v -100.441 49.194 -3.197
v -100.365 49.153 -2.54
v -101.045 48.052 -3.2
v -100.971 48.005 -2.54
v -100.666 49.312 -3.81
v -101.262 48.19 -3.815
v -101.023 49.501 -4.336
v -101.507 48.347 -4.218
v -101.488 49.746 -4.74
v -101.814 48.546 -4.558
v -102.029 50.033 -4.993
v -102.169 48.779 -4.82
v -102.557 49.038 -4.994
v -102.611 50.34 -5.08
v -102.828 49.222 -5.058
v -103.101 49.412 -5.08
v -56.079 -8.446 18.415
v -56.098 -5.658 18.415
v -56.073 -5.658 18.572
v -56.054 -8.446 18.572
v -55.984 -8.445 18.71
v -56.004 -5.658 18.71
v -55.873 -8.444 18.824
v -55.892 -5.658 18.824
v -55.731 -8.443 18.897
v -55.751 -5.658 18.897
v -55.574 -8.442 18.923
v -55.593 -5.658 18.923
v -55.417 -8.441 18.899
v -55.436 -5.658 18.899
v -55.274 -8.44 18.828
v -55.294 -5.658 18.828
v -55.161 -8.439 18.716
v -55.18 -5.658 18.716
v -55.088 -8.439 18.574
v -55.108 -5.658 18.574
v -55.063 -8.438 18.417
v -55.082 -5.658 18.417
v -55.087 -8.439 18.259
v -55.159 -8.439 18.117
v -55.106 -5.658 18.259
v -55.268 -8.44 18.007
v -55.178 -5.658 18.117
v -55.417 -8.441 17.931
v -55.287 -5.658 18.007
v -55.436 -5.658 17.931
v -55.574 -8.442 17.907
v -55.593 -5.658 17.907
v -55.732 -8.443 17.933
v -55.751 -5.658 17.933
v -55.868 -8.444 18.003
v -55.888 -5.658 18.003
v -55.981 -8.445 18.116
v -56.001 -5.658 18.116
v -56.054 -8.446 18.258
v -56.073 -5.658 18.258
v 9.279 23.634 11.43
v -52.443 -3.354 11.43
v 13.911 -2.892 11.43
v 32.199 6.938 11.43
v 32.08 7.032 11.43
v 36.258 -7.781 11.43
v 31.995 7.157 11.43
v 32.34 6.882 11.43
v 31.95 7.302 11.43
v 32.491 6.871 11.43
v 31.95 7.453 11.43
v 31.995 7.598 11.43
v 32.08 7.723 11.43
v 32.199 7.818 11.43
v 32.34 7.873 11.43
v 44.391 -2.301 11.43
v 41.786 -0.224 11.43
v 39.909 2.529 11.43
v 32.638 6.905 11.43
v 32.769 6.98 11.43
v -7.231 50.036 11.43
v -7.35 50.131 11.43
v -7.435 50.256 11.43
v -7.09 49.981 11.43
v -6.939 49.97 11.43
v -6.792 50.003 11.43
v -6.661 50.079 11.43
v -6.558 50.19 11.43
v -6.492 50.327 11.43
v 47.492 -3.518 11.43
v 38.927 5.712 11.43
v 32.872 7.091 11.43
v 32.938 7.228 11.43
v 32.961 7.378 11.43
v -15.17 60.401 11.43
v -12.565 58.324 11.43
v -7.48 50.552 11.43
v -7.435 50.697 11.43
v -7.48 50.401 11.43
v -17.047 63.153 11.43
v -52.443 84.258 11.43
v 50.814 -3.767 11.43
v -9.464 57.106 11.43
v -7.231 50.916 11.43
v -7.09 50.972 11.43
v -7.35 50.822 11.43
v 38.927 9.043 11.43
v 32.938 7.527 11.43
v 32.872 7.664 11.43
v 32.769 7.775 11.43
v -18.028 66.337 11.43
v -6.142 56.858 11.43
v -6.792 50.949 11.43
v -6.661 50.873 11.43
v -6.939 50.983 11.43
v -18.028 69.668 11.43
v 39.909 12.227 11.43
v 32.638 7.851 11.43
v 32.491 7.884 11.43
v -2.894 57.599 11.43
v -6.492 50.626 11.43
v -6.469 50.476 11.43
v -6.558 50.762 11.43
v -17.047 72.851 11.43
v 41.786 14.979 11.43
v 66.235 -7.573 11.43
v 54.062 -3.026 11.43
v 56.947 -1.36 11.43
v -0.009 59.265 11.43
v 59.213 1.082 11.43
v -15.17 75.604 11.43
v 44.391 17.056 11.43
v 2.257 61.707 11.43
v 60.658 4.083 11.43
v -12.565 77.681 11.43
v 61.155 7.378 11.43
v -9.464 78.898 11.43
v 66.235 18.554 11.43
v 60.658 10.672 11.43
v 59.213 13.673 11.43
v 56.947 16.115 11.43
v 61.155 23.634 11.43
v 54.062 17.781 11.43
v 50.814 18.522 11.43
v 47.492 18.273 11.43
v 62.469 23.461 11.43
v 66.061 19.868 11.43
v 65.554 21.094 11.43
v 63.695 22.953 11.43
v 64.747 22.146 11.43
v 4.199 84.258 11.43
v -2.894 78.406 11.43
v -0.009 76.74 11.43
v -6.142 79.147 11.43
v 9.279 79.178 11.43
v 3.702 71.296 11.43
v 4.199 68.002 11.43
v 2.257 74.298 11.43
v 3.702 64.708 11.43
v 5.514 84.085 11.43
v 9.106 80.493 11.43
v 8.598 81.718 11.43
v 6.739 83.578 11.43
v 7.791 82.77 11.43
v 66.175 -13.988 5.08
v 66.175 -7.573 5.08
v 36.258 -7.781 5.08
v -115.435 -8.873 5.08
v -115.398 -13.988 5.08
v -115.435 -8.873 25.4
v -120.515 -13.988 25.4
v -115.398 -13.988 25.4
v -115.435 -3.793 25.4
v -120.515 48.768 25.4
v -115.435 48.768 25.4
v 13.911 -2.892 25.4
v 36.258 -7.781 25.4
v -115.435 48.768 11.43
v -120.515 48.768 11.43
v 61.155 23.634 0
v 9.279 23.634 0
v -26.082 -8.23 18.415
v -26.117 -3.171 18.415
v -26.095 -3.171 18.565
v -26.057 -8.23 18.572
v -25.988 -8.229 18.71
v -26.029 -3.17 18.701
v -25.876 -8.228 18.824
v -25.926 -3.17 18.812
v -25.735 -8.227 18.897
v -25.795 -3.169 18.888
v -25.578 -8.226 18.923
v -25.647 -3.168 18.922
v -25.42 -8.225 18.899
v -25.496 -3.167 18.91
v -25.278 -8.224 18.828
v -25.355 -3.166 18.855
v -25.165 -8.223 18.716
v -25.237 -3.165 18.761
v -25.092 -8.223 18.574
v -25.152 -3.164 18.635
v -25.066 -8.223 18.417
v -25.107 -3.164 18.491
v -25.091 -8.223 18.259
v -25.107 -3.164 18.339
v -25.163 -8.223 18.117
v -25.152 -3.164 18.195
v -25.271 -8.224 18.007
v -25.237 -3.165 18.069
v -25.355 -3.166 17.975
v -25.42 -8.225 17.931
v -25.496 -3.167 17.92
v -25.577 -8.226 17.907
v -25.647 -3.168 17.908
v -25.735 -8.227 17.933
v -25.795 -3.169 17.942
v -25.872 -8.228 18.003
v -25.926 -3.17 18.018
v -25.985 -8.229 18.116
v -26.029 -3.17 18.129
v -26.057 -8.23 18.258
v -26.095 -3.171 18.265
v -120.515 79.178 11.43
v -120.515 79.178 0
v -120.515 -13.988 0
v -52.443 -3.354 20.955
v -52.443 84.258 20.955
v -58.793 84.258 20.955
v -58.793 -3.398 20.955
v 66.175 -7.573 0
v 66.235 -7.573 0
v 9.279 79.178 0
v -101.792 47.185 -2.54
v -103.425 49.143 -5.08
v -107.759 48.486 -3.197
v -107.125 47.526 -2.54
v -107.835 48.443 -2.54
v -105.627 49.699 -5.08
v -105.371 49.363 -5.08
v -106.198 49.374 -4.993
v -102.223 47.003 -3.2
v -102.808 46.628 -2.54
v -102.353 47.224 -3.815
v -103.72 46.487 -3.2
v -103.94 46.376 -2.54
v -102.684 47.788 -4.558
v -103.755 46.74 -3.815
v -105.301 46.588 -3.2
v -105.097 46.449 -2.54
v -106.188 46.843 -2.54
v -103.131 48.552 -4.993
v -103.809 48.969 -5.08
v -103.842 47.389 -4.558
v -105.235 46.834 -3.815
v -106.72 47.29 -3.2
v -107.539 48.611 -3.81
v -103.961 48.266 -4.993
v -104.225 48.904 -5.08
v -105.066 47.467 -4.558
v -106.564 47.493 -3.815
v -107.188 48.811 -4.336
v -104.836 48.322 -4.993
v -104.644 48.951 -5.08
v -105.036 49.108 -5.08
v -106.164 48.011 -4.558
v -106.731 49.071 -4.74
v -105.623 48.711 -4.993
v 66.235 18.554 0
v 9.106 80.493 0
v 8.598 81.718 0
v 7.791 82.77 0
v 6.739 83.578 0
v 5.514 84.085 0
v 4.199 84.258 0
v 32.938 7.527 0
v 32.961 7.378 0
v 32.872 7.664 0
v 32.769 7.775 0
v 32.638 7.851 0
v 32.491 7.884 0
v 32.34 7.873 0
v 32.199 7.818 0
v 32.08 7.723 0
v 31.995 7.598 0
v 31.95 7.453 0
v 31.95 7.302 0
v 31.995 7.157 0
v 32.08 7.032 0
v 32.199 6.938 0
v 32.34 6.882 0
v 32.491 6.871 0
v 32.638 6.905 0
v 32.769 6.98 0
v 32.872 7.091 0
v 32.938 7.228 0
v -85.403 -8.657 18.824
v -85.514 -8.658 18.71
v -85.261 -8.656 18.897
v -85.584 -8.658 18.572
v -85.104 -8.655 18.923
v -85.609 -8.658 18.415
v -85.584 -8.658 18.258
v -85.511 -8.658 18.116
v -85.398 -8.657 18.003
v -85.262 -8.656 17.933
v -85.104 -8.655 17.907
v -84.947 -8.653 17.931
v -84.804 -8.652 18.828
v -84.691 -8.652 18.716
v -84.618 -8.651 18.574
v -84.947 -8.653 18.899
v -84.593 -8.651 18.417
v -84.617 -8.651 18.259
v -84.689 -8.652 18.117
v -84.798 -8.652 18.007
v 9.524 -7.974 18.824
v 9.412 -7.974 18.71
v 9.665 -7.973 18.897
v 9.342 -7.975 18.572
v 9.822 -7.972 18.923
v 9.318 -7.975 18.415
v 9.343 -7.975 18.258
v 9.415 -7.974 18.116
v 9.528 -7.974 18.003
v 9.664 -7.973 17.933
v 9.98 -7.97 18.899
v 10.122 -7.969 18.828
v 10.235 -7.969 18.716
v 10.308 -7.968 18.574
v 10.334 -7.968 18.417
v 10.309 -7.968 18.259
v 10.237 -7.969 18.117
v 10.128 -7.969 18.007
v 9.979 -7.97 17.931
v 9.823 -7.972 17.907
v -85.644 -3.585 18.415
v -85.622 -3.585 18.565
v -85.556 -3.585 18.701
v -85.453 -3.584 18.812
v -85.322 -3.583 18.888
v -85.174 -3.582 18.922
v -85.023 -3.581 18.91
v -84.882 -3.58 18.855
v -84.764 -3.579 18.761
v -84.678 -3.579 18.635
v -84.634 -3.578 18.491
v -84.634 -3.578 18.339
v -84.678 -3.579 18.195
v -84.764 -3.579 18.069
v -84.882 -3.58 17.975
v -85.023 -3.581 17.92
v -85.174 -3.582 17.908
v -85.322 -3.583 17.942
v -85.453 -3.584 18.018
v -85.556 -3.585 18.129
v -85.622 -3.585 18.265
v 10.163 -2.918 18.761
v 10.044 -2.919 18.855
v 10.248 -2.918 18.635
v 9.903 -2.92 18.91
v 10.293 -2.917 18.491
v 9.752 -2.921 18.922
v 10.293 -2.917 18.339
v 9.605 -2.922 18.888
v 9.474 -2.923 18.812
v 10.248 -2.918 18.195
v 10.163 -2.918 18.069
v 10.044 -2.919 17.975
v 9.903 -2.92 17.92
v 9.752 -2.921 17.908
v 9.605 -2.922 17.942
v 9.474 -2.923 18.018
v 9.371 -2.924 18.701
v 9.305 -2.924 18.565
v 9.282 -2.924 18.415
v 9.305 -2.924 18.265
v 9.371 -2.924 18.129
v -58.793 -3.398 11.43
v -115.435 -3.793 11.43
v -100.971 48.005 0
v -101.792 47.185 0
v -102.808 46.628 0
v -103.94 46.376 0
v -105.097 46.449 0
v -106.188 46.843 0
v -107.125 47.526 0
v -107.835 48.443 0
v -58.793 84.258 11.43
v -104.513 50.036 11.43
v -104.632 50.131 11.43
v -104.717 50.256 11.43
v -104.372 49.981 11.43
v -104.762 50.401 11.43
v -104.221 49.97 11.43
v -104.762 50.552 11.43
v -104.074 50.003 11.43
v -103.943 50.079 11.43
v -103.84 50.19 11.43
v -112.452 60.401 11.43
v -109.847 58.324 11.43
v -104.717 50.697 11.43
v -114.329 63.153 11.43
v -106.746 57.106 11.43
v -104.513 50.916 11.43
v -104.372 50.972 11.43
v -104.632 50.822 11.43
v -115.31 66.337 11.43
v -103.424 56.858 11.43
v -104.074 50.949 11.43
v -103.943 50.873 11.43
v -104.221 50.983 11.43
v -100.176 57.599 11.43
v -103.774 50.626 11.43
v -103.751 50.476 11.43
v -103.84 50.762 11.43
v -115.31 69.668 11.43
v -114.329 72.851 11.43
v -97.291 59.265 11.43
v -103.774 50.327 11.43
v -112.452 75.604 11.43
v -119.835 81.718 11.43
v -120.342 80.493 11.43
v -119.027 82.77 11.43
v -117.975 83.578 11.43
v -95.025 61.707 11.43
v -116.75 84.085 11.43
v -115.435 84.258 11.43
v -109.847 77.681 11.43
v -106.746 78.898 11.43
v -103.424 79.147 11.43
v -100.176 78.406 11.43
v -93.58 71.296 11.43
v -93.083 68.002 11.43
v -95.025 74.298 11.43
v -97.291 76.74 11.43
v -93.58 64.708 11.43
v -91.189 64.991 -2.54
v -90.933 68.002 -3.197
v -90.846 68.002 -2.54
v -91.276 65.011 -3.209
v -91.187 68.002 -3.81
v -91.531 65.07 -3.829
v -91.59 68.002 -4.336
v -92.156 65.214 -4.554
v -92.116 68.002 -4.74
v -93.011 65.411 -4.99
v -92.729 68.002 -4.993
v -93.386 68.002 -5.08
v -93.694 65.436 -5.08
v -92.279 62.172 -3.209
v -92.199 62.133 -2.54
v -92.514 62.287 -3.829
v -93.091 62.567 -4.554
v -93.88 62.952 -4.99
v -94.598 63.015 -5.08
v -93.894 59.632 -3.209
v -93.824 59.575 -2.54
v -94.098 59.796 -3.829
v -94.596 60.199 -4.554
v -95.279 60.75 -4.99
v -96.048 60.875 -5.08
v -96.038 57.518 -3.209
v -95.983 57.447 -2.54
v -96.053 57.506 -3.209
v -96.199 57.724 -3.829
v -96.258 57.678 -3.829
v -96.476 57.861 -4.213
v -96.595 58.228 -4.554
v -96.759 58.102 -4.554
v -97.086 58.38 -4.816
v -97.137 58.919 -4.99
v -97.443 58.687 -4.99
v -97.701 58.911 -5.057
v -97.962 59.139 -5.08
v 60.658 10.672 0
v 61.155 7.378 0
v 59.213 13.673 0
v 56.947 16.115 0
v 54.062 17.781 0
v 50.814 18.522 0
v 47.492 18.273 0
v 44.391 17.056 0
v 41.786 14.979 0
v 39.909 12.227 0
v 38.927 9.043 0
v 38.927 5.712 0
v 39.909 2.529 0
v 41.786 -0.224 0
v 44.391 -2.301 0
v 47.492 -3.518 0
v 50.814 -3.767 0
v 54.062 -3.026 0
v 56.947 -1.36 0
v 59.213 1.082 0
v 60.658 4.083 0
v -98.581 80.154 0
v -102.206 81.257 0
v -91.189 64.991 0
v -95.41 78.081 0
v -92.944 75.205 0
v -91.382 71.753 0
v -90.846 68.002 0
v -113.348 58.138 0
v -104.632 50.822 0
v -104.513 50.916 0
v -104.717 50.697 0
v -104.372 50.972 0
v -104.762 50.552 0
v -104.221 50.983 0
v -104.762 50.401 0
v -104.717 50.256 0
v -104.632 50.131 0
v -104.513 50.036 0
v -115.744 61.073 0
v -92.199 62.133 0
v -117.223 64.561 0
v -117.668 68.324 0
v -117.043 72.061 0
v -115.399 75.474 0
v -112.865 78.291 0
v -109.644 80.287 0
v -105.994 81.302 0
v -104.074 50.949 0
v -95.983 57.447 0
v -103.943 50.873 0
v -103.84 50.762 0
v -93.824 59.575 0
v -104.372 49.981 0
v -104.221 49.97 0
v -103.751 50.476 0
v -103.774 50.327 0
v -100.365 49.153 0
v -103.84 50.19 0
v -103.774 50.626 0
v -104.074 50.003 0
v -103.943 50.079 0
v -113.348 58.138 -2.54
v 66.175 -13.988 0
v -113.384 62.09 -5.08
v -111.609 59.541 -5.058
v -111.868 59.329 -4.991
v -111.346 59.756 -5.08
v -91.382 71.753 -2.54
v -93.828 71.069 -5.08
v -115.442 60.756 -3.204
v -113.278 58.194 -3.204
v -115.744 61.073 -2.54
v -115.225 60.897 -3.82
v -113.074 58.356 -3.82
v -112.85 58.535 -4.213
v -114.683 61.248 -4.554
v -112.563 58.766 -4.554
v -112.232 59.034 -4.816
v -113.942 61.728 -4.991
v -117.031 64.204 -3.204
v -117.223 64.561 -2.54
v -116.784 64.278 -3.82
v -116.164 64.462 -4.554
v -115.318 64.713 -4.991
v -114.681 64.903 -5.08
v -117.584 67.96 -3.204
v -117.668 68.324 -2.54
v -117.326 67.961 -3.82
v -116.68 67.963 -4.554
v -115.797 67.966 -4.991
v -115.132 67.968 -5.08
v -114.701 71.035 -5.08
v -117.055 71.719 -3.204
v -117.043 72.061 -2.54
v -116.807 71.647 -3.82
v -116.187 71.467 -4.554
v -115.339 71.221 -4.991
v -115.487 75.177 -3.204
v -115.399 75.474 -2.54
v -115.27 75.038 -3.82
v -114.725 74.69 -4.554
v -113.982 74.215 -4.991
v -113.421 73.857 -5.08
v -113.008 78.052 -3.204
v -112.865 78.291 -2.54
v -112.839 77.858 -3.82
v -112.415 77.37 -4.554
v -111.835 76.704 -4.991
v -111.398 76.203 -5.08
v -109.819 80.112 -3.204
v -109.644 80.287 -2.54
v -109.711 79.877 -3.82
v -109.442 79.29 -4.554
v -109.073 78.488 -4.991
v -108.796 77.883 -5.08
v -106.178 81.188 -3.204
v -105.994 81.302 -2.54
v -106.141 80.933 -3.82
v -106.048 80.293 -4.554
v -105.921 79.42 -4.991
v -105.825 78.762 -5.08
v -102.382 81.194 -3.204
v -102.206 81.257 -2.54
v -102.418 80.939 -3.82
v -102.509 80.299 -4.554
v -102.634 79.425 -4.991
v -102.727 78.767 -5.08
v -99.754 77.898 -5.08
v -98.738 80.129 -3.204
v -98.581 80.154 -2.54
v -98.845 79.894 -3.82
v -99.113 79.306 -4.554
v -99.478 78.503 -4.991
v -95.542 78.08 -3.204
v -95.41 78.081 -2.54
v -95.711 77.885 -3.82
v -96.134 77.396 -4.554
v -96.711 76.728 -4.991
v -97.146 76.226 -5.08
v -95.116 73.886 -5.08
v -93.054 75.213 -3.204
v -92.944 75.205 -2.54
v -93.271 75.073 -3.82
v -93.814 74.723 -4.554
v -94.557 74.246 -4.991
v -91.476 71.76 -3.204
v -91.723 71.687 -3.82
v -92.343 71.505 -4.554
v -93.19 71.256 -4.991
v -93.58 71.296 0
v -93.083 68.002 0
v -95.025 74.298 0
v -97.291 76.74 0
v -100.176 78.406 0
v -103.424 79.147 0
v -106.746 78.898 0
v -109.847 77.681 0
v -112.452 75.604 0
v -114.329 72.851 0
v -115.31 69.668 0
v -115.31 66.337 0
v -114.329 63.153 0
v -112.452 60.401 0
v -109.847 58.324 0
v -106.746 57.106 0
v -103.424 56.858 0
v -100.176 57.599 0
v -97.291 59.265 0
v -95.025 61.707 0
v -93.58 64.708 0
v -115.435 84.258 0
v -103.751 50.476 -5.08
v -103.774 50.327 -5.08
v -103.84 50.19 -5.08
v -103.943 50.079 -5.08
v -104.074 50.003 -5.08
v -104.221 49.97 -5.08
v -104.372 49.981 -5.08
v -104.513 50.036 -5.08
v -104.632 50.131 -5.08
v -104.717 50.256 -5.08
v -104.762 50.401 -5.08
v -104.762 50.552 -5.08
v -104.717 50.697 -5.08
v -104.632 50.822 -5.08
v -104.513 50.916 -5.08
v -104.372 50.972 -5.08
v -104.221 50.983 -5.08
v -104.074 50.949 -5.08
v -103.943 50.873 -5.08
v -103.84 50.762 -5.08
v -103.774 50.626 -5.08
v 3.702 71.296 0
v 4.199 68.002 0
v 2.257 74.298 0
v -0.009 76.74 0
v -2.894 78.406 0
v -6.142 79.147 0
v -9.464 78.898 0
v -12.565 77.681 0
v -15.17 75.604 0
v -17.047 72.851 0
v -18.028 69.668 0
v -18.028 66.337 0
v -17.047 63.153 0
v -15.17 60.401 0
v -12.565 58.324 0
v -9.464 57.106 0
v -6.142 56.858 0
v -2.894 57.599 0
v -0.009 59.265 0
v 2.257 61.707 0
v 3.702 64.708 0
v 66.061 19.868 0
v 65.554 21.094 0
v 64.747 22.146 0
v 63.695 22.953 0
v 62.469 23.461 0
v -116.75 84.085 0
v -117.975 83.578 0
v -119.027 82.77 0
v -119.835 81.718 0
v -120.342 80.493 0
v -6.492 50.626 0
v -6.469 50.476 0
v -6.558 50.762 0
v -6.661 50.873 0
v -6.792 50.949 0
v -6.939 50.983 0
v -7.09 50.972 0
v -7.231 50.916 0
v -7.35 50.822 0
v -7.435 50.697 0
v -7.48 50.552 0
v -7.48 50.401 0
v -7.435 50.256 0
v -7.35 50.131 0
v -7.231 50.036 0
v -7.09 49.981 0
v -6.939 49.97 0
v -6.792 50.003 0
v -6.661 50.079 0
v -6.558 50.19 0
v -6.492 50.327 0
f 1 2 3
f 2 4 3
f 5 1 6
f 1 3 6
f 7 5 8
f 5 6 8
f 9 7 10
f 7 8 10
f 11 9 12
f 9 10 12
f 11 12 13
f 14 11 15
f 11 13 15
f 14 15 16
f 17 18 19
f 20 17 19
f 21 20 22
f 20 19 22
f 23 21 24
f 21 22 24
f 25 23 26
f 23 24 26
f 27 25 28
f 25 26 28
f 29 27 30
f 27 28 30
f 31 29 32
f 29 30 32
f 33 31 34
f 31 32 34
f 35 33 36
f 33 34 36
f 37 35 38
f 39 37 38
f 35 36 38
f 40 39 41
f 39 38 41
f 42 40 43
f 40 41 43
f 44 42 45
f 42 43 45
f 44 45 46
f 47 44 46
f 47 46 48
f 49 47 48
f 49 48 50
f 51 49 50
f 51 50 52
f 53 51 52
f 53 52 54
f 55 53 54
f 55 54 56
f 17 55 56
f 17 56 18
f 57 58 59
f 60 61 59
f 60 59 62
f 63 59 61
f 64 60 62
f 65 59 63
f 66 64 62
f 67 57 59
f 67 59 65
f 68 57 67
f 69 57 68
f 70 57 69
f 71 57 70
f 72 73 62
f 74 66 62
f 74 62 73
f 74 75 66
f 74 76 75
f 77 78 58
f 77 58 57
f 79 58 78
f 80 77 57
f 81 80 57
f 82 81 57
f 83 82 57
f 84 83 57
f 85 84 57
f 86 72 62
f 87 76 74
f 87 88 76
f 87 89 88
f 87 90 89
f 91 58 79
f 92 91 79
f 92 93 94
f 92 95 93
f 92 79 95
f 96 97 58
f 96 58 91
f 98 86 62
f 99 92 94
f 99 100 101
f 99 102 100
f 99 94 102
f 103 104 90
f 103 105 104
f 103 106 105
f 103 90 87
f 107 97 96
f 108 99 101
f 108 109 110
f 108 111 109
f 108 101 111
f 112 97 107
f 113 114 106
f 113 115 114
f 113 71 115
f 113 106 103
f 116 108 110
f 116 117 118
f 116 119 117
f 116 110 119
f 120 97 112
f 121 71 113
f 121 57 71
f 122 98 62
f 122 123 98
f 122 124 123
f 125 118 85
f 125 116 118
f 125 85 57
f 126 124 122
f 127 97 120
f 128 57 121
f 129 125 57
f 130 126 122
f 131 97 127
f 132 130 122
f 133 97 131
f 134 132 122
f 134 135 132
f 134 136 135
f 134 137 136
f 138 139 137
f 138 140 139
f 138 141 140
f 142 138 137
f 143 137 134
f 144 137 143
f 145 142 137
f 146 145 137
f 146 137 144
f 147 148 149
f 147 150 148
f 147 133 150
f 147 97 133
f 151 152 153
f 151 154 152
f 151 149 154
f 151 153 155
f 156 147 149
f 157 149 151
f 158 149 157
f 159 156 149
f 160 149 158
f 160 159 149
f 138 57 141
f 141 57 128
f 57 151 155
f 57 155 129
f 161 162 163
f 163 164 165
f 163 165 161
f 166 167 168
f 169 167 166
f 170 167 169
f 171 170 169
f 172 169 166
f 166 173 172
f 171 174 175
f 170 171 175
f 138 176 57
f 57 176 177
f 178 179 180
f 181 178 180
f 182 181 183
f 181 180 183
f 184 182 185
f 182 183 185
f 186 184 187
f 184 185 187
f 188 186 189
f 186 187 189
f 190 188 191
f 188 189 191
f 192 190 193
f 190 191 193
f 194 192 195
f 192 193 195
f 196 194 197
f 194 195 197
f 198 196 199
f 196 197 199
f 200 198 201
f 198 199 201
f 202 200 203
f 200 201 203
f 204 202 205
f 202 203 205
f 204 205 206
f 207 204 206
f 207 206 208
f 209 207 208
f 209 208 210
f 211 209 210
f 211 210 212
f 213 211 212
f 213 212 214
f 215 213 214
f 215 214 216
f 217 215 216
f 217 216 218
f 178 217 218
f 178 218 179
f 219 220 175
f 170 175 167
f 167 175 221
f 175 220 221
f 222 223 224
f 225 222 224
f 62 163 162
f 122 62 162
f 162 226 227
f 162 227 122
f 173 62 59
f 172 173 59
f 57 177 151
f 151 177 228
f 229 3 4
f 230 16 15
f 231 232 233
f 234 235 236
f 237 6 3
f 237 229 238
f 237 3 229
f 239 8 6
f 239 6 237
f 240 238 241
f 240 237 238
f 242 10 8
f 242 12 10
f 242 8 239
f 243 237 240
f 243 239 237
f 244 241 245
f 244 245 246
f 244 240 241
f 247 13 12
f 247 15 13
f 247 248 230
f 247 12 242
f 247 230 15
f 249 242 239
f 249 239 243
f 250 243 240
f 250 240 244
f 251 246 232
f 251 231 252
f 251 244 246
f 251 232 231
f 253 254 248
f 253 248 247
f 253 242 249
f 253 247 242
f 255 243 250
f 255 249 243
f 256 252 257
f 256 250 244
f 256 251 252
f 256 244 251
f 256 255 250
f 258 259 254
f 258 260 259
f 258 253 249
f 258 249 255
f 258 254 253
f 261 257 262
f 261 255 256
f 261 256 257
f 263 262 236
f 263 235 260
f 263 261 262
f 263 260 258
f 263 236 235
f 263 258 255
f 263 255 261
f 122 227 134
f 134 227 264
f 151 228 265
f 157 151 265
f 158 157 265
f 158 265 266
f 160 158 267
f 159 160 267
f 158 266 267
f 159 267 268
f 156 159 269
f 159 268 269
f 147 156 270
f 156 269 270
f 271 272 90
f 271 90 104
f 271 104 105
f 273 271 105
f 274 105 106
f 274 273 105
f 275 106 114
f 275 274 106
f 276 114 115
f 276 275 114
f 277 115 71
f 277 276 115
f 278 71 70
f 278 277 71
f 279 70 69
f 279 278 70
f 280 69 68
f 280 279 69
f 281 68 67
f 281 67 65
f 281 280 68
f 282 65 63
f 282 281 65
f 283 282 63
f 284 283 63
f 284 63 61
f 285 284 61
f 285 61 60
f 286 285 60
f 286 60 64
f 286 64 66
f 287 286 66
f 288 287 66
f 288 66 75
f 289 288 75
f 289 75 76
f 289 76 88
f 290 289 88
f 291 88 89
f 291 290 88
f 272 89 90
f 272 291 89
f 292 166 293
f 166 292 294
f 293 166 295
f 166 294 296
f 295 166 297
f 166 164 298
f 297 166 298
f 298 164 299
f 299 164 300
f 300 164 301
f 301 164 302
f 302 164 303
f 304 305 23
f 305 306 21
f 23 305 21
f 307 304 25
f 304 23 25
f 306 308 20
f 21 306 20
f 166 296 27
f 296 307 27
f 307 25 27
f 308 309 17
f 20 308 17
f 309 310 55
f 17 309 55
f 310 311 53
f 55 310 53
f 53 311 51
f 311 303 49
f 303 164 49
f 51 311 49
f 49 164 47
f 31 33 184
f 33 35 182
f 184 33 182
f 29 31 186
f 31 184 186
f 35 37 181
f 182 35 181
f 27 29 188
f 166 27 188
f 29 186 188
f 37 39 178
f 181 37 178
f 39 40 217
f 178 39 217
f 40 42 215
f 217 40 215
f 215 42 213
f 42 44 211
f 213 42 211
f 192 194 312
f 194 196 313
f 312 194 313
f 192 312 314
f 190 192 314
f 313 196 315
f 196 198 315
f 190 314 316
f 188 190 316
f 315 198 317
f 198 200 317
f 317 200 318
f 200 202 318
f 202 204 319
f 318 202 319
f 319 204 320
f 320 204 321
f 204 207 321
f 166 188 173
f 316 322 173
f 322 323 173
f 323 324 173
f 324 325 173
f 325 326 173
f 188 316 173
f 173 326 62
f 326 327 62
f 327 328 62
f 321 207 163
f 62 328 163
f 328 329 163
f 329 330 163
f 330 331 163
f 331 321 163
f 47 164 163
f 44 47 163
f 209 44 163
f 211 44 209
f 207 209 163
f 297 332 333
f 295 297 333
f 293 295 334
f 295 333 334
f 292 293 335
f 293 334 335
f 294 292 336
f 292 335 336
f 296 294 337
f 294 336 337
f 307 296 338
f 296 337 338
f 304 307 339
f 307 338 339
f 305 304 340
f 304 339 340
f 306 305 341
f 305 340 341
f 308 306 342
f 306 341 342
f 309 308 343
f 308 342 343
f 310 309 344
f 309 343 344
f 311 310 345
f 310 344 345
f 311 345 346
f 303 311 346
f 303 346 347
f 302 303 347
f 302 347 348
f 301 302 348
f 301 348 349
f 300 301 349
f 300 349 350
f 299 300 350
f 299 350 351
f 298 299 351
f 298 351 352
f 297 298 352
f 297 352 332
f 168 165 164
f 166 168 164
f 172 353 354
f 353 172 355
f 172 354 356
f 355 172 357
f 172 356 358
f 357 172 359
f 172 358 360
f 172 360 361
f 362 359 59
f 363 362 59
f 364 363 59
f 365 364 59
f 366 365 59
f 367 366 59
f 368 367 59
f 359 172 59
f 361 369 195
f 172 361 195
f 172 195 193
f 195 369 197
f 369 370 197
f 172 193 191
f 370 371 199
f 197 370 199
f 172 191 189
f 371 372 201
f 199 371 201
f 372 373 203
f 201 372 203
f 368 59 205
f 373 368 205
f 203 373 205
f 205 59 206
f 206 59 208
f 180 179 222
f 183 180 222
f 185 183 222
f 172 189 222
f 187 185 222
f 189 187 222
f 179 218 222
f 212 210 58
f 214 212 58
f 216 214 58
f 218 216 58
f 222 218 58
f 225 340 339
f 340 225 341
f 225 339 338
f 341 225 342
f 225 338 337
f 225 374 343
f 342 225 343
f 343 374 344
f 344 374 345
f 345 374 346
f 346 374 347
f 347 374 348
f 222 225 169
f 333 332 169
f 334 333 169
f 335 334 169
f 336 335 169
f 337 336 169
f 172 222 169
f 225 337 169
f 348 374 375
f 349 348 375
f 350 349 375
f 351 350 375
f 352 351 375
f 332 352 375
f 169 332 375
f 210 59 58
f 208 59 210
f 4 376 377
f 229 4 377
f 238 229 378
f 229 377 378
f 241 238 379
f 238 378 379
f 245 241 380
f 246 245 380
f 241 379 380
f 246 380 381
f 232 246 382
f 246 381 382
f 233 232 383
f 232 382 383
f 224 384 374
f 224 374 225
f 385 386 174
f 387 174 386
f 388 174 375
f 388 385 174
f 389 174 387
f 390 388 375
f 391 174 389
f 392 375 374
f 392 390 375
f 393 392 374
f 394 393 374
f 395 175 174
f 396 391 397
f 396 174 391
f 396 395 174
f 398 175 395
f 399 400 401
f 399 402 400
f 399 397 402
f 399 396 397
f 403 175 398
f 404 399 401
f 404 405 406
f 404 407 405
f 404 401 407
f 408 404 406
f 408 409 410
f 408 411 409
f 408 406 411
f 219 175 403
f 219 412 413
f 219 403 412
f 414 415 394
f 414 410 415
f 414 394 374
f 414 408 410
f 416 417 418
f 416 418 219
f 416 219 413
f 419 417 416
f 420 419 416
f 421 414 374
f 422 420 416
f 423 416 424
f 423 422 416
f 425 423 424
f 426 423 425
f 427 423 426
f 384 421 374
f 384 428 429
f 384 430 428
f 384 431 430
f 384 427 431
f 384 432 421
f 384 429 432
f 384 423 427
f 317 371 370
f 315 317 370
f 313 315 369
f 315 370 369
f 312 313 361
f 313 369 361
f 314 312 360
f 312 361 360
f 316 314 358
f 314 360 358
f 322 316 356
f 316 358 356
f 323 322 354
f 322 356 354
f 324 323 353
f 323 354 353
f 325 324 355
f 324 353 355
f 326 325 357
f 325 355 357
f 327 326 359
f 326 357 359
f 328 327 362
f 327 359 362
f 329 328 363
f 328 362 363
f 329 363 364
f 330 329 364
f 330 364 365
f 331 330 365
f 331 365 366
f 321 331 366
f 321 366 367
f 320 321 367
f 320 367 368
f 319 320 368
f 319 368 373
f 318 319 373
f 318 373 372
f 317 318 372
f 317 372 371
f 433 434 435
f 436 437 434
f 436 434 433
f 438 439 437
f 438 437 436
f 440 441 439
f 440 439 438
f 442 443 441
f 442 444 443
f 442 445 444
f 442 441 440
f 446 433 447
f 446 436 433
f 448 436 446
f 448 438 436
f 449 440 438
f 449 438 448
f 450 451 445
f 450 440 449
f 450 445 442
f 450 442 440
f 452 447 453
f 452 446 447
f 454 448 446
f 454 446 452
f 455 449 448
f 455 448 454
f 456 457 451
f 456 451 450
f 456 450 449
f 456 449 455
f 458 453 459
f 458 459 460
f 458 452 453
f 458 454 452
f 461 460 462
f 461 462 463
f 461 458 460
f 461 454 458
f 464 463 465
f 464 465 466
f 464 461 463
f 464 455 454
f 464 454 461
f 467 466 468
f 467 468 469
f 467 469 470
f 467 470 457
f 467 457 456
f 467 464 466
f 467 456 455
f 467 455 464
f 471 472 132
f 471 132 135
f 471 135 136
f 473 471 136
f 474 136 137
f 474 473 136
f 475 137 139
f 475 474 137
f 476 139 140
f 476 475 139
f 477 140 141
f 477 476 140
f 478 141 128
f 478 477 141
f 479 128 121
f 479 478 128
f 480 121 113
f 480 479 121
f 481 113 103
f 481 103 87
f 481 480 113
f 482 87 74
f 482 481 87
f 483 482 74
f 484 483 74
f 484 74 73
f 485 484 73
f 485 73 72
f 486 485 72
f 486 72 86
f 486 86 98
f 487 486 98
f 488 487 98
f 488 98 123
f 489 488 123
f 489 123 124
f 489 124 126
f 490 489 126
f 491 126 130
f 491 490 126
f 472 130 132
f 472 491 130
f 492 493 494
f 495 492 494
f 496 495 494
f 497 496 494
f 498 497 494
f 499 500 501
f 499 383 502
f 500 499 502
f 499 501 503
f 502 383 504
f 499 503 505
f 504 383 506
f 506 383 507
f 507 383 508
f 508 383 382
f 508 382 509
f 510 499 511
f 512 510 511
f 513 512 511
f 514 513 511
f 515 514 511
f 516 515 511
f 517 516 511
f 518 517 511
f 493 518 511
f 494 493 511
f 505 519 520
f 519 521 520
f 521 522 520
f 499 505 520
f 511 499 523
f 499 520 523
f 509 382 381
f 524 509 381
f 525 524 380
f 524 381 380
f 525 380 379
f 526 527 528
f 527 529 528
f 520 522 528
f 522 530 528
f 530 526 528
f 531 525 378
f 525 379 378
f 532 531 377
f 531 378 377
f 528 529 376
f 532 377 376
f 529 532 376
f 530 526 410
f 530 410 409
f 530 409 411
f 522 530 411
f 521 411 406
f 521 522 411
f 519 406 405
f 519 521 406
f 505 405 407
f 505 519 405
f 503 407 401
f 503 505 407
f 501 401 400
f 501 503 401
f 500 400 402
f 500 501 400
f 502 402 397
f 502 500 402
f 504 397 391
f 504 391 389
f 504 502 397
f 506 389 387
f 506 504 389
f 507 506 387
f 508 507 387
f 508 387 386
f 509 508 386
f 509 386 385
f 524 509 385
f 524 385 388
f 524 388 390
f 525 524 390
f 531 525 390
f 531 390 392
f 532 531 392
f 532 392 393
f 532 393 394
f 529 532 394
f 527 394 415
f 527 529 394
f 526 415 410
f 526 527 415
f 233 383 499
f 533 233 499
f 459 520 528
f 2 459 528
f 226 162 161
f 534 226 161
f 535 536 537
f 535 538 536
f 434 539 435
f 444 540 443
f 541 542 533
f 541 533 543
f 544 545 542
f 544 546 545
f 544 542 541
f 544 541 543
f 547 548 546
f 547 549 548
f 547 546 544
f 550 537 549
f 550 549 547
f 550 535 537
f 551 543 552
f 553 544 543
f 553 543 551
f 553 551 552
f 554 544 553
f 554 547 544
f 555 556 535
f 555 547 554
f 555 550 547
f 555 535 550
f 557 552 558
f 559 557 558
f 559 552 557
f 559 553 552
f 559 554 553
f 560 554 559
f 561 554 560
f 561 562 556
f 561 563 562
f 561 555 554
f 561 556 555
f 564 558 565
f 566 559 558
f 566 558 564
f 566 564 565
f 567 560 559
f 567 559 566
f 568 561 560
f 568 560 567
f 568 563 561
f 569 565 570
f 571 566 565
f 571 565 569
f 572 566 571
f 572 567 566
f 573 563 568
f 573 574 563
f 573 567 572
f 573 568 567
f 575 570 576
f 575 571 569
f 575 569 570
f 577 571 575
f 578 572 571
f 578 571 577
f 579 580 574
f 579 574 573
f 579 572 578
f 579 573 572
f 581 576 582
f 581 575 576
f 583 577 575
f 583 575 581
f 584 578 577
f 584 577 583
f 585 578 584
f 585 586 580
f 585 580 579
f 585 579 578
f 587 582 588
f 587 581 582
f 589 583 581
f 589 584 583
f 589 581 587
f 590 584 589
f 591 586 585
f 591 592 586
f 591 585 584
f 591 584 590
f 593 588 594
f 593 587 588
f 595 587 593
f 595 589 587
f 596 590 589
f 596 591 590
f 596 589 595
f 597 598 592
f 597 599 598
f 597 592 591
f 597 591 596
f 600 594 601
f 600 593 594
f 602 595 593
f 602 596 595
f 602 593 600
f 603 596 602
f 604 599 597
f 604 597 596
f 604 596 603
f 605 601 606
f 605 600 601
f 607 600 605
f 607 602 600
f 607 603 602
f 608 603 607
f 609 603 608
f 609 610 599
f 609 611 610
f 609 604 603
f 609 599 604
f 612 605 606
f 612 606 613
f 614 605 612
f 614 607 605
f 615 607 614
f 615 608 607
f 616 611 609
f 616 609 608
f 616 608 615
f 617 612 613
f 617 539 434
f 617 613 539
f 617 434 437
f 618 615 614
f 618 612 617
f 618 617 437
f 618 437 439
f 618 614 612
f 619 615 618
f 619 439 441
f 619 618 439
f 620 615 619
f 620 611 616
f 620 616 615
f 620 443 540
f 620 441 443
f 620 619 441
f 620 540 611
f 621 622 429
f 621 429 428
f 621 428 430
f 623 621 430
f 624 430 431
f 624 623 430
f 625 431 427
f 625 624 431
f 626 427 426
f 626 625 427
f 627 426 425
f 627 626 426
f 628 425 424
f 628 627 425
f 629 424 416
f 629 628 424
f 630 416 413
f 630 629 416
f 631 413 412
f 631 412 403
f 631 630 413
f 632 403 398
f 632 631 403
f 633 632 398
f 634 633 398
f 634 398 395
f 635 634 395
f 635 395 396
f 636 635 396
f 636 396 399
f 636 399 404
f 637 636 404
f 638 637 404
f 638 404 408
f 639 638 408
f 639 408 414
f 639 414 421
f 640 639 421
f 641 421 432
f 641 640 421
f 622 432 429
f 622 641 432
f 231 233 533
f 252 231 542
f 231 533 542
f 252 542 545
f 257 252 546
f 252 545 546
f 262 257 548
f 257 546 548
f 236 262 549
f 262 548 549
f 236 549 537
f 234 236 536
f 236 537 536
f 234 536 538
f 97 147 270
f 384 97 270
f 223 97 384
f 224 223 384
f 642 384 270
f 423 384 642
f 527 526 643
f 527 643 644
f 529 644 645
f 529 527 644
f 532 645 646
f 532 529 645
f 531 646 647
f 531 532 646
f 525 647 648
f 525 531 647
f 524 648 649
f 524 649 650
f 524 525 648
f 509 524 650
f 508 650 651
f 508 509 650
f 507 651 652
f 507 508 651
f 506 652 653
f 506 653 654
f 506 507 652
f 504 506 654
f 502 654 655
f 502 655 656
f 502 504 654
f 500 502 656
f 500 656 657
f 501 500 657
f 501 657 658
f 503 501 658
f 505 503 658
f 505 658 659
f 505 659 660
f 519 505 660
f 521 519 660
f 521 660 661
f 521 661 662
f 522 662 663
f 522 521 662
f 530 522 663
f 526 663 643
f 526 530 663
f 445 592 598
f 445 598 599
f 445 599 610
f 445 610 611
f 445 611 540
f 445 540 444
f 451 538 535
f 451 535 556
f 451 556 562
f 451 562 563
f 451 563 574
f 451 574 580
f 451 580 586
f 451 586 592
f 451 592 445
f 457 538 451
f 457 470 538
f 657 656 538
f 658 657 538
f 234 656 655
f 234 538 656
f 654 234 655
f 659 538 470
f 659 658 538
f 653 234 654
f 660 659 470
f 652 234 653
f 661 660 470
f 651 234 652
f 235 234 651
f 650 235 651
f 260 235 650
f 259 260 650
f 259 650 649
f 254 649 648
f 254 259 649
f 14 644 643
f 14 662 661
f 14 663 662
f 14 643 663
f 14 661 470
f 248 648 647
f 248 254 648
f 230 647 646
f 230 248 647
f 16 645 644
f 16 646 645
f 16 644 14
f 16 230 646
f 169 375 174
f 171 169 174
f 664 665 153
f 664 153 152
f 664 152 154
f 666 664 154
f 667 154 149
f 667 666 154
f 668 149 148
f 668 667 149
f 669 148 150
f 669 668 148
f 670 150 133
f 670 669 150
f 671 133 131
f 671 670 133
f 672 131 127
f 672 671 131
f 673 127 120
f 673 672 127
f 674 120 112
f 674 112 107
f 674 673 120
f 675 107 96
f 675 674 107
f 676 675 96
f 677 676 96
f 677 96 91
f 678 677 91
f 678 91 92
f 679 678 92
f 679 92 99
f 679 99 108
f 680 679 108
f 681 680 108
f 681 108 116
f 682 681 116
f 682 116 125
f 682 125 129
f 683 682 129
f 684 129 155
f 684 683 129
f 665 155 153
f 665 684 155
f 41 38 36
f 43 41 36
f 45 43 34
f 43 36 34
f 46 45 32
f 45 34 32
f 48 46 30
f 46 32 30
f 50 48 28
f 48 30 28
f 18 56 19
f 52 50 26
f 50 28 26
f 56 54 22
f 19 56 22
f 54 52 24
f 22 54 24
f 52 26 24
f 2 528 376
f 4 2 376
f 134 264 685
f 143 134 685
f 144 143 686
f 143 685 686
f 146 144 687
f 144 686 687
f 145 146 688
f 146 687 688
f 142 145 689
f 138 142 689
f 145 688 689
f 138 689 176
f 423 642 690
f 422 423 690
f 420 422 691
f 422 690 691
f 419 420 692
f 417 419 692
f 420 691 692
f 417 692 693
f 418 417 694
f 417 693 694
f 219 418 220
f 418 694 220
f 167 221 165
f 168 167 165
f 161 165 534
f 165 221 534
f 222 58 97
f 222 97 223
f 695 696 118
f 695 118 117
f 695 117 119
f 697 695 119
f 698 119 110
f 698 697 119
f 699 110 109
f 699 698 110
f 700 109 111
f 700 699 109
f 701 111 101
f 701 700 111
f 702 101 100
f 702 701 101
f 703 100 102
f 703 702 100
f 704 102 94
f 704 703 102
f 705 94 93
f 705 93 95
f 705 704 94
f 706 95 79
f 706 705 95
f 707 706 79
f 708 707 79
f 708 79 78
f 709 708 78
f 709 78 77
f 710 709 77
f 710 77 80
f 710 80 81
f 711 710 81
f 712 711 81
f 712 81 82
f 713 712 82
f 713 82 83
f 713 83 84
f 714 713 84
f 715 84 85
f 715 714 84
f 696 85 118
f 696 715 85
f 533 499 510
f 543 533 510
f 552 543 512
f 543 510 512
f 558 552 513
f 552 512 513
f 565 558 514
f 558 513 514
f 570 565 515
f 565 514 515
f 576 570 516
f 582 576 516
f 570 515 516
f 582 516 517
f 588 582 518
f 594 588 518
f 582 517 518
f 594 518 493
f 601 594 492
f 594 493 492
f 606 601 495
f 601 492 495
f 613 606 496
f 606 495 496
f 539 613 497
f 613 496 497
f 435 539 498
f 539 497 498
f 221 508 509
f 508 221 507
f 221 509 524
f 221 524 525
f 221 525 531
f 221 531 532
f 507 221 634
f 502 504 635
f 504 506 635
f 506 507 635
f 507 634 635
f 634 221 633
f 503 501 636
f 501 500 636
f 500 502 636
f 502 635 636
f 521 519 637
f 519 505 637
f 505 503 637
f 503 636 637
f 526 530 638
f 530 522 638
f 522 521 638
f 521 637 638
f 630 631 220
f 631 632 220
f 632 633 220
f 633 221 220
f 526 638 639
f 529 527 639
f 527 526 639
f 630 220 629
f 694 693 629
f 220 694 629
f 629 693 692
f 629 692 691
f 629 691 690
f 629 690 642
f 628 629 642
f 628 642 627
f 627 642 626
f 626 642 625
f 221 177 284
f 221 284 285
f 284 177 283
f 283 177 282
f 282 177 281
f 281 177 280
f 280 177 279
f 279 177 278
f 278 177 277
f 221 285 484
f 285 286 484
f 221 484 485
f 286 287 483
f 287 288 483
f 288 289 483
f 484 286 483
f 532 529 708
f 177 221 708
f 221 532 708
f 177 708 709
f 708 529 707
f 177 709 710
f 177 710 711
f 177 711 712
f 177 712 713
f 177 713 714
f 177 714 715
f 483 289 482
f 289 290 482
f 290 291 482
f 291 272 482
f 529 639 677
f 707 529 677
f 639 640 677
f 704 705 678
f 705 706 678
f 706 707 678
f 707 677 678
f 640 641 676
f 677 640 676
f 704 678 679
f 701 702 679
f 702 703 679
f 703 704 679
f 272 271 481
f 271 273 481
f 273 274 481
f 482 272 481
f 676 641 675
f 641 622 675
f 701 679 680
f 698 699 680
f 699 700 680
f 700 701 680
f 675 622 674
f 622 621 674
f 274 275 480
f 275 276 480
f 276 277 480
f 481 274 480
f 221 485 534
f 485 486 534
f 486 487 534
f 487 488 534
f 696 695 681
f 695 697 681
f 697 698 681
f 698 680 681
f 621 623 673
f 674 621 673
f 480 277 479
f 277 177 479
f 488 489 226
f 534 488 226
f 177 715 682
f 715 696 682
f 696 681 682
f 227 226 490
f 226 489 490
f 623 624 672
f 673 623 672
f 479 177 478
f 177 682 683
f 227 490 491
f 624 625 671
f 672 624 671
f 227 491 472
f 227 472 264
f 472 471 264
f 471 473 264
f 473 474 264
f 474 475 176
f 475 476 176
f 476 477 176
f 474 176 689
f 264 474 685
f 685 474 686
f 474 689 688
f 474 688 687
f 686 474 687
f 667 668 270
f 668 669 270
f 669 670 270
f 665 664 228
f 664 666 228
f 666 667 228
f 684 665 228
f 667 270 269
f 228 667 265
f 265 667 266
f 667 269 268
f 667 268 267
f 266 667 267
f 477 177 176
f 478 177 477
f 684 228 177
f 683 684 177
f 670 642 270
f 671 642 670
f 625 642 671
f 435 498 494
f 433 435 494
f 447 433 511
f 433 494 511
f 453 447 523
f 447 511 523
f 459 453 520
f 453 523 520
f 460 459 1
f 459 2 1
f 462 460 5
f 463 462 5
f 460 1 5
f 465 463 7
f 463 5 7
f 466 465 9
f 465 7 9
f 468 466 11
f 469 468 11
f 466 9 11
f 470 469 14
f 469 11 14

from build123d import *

# Parameters (mm, degrees)
F0_R      = 0.508
F0_R_2    = 11.176
F1_DEPTH  = 11.43
F3_DEPTH  = 25.4
F4_R      = 0.508
F5_DEPTH  = 11.4608454435
F6_W      = 6.7929165438
F6_H      = 5.08
F7_DEPTH  = 186.69
F8_W      = 6.35
F8_H      = 9.525
F9_DEPTH  = 89.916
F10_R     = 11.176
F10_R_2   = 0.508
F11_DEPTH = 5.08
F12_R     = 2.54


with BuildPart() as f1:
    # F0 (on Top) → F1 (new body)
    with BuildSketch(Plane.XY):
        with BuildLine():
            Line((9.2787205281, 23.6336458474), (9.2787205281, 79.1782657933))
            ThreePointArc((9.2787205281, 79.1782657933), (7.7908229766, 82.7703682418), (4.1987205281, 84.2582657933))
            Line((4.1987205281, 84.2582657933), (-115.4352794719, 84.2582657933))
            ThreePointArc((-115.4352794719, 84.2582657933), (-119.0273819203, 82.7703682418), (-120.5152794719, 79.1782657933))
            Line((-120.5152794719, 79.1782657933), (-120.5152794719, -8.872853592))
            Line((-120.5152794719, -8.872853592), (66.2345588207, -7.5725922361))
            Line((66.2345588207, -7.5725922361), (66.2345588207, 18.5536458474))
            ThreePointArc((66.2345588207, 18.5536458474), (64.7466612692, 22.1457482959), (61.1545588207, 23.6336458474))
            Line((61.1545588207, 23.6336458474), (9.2787205281, 23.6336458474))
        make_face()
        with Locations((32.4525588207, 7.3776458474)):
            Circle(F0_R, mode=Mode.SUBTRACT)
        with Locations((49.9785588207, 7.3776458474)):
            Circle(F0_R_2, mode=Mode.SUBTRACT)
        with Locations((-104.2592794719, 50.4762657933)):
            Circle(F0_R, mode=Mode.SUBTRACT)
        with Locations((-104.2592794719, 68.0022657933)):
            Circle(F0_R_2, mode=Mode.SUBTRACT)
        with Locations((-6.9772794719, 50.4762657933)):
            Circle(F0_R, mode=Mode.SUBTRACT)
        with Locations((-6.9772794719, 68.0022657933)):
            Circle(F0_R_2, mode=Mode.SUBTRACT)
    extrude(amount=F1_DEPTH)

    # F2 (on Top) → F3 (join)
    with BuildSketch(Plane.XY):
        Polygon((-115.4352794719, 48.7675257027), (-120.5152794719, 48.7675257027), (-120.5152794719, -13.9880853735), (-115.3984715341, -13.9880853735), (-115.4352794719, -8.872853592), (36.2575173668, -7.7813098924), (13.9111343974, -2.8922683759), (-115.4352794719, -3.792853592), align=None)
    extrude(amount=F3_DEPTH)

    # F4 (on face) → F5 (cut, through all)
    with BuildSketch(Plane(origin=(0.0208110294, -2.9889809132, 0), x_dir=(-0.9999757621, -0.0069624148, 0), z_dir=(-0.0069624148, 0.9999757621, 0))):
        with Locations((-9.7697973251, 18.415)):
            Circle(F4_R)
        with Locations((25.6308149546, 18.415)):
            Circle(F4_R)
        with Locations((55.6280761957, 18.415)):
            Circle(F4_R)
        with Locations((85.1589813828, 18.415)):
            Circle(F4_R)
    extrude(amount=-F5_DEPTH, mode=Mode.SUBTRACT)

    # F6 (on face) → F7 (join)
    with BuildSketch(Plane(origin=(-120.5152794719, 0, 0), x_dir=(0, -1, 0), z_dir=(-1, 0, 0))):
        with Locations((10.5916271016, 2.54)):
            Rectangle(F6_W, F6_H)
    extrude(amount=-F7_DEPTH)

    # F8 (on face) → F9 (join)
    with BuildSketch(Plane(origin=(0, 84.2582657933, 0), x_dir=(-1, 0, 0), z_dir=(0, 1, 0))):
        with Locations((55.6182794719, 16.1925)):
            Rectangle(F8_W, F8_H)
    extrude(amount=-F9_DEPTH)


with BuildPart() as f11:
    # F10 (on face) → F11 (new body)
    with BuildSketch(Plane(origin=(0, 0, 0), x_dir=(1, 0, 0), z_dir=(0, 0, -1))):
        with BuildLine():
            ThreePointArc((-113.3479585097, -58.1381371295), (-109.6444367223, -80.286613653), (-90.8464080064, -68.0022657933))
            ThreePointArc((-90.8464080064, -68.0022657933), (-92.1986532448, -62.1331588801), (-95.9827303886, -57.447463274))
            ThreePointArc((-95.9827303886, -57.447463274), (-99.8812141792, -55.3240299049), (-104.2592794719, -54.5893943279))
            ThreePointArc((-104.2592794719, -54.5893943279), (-109.1377439363, -55.5080389098), (-113.3479585097, -58.1381371295))
        make_face()
        with Locations((-104.2592794719, -68.0022657933)):
            Circle(F10_R, mode=Mode.SUBTRACT)
        with BuildLine():
            ThreePointArc((-104.2592794719, -54.5893943279), (-99.8812141792, -55.3240299049), (-95.9827303886, -57.447463274))
            Line((-95.9827303886, -57.447463274), (-100.364795277, -49.1530805465))
            ThreePointArc((-100.364795277, -49.1530805465), (-100.2011801378, -49.80570175), (-100.1461509373, -50.4762657933))
            ThreePointArc((-100.1461509373, -50.4762657933), (-101.3508583932, -53.384686872), (-104.2592794719, -54.5893943279))
        make_face()
        with BuildLine():
            Line((-107.8347285432, -48.4430441429), (-113.3479585097, -58.1381371295))
            ThreePointArc((-113.3479585097, -58.1381371295), (-109.1377439363, -55.5080389098), (-104.2592794719, -54.5893943279))
            ThreePointArc((-104.2592794719, -54.5893943279), (-107.8146084531, -52.5444684374), (-107.8347285432, -48.4430441429))
        make_face()
        with BuildLine():
            ThreePointArc((-107.8347285432, -48.4430441429), (-107.8146084531, -52.5444684374), (-104.2592794719, -54.5893943279))
            ThreePointArc((-104.2592794719, -54.5893943279), (-101.3508583932, -53.384686872), (-100.1461509373, -50.4762657933))
            ThreePointArc((-100.1461509373, -50.4762657933), (-100.2011801378, -49.80570175), (-100.364795277, -49.1530805465))
            Line((-100.364795277, -49.1530805465), (-100.9714052762, -48.0048877131))
            ThreePointArc((-100.9714052762, -48.0048877131), (-104.5213292601, -46.3714934184), (-107.8347285432, -48.4430441429))
        make_face()
        with Locations((-104.2592794719, -50.4762657933)):
            Circle(F10_R_2, mode=Mode.SUBTRACT)
        with Locations((-104.2592794719, -68.0022657933)):
            Circle(F10_R)
    extrude(amount=F11_DEPTH)

    # F12
    f12_edges = [f11.edges().sort_by_distance(p)[0] for p in [
        (-103.726226, 81.404541, -5.08),
        (-98.477068, 52.726175, -5.08),
        (-110.591344, 53.290591, -5.08),
        (-104.521329, 46.371493, -5.08),
    ]]
    fillet(f12_edges, radius=F12_R)


solid = Compound([f1.part, f11.part])
